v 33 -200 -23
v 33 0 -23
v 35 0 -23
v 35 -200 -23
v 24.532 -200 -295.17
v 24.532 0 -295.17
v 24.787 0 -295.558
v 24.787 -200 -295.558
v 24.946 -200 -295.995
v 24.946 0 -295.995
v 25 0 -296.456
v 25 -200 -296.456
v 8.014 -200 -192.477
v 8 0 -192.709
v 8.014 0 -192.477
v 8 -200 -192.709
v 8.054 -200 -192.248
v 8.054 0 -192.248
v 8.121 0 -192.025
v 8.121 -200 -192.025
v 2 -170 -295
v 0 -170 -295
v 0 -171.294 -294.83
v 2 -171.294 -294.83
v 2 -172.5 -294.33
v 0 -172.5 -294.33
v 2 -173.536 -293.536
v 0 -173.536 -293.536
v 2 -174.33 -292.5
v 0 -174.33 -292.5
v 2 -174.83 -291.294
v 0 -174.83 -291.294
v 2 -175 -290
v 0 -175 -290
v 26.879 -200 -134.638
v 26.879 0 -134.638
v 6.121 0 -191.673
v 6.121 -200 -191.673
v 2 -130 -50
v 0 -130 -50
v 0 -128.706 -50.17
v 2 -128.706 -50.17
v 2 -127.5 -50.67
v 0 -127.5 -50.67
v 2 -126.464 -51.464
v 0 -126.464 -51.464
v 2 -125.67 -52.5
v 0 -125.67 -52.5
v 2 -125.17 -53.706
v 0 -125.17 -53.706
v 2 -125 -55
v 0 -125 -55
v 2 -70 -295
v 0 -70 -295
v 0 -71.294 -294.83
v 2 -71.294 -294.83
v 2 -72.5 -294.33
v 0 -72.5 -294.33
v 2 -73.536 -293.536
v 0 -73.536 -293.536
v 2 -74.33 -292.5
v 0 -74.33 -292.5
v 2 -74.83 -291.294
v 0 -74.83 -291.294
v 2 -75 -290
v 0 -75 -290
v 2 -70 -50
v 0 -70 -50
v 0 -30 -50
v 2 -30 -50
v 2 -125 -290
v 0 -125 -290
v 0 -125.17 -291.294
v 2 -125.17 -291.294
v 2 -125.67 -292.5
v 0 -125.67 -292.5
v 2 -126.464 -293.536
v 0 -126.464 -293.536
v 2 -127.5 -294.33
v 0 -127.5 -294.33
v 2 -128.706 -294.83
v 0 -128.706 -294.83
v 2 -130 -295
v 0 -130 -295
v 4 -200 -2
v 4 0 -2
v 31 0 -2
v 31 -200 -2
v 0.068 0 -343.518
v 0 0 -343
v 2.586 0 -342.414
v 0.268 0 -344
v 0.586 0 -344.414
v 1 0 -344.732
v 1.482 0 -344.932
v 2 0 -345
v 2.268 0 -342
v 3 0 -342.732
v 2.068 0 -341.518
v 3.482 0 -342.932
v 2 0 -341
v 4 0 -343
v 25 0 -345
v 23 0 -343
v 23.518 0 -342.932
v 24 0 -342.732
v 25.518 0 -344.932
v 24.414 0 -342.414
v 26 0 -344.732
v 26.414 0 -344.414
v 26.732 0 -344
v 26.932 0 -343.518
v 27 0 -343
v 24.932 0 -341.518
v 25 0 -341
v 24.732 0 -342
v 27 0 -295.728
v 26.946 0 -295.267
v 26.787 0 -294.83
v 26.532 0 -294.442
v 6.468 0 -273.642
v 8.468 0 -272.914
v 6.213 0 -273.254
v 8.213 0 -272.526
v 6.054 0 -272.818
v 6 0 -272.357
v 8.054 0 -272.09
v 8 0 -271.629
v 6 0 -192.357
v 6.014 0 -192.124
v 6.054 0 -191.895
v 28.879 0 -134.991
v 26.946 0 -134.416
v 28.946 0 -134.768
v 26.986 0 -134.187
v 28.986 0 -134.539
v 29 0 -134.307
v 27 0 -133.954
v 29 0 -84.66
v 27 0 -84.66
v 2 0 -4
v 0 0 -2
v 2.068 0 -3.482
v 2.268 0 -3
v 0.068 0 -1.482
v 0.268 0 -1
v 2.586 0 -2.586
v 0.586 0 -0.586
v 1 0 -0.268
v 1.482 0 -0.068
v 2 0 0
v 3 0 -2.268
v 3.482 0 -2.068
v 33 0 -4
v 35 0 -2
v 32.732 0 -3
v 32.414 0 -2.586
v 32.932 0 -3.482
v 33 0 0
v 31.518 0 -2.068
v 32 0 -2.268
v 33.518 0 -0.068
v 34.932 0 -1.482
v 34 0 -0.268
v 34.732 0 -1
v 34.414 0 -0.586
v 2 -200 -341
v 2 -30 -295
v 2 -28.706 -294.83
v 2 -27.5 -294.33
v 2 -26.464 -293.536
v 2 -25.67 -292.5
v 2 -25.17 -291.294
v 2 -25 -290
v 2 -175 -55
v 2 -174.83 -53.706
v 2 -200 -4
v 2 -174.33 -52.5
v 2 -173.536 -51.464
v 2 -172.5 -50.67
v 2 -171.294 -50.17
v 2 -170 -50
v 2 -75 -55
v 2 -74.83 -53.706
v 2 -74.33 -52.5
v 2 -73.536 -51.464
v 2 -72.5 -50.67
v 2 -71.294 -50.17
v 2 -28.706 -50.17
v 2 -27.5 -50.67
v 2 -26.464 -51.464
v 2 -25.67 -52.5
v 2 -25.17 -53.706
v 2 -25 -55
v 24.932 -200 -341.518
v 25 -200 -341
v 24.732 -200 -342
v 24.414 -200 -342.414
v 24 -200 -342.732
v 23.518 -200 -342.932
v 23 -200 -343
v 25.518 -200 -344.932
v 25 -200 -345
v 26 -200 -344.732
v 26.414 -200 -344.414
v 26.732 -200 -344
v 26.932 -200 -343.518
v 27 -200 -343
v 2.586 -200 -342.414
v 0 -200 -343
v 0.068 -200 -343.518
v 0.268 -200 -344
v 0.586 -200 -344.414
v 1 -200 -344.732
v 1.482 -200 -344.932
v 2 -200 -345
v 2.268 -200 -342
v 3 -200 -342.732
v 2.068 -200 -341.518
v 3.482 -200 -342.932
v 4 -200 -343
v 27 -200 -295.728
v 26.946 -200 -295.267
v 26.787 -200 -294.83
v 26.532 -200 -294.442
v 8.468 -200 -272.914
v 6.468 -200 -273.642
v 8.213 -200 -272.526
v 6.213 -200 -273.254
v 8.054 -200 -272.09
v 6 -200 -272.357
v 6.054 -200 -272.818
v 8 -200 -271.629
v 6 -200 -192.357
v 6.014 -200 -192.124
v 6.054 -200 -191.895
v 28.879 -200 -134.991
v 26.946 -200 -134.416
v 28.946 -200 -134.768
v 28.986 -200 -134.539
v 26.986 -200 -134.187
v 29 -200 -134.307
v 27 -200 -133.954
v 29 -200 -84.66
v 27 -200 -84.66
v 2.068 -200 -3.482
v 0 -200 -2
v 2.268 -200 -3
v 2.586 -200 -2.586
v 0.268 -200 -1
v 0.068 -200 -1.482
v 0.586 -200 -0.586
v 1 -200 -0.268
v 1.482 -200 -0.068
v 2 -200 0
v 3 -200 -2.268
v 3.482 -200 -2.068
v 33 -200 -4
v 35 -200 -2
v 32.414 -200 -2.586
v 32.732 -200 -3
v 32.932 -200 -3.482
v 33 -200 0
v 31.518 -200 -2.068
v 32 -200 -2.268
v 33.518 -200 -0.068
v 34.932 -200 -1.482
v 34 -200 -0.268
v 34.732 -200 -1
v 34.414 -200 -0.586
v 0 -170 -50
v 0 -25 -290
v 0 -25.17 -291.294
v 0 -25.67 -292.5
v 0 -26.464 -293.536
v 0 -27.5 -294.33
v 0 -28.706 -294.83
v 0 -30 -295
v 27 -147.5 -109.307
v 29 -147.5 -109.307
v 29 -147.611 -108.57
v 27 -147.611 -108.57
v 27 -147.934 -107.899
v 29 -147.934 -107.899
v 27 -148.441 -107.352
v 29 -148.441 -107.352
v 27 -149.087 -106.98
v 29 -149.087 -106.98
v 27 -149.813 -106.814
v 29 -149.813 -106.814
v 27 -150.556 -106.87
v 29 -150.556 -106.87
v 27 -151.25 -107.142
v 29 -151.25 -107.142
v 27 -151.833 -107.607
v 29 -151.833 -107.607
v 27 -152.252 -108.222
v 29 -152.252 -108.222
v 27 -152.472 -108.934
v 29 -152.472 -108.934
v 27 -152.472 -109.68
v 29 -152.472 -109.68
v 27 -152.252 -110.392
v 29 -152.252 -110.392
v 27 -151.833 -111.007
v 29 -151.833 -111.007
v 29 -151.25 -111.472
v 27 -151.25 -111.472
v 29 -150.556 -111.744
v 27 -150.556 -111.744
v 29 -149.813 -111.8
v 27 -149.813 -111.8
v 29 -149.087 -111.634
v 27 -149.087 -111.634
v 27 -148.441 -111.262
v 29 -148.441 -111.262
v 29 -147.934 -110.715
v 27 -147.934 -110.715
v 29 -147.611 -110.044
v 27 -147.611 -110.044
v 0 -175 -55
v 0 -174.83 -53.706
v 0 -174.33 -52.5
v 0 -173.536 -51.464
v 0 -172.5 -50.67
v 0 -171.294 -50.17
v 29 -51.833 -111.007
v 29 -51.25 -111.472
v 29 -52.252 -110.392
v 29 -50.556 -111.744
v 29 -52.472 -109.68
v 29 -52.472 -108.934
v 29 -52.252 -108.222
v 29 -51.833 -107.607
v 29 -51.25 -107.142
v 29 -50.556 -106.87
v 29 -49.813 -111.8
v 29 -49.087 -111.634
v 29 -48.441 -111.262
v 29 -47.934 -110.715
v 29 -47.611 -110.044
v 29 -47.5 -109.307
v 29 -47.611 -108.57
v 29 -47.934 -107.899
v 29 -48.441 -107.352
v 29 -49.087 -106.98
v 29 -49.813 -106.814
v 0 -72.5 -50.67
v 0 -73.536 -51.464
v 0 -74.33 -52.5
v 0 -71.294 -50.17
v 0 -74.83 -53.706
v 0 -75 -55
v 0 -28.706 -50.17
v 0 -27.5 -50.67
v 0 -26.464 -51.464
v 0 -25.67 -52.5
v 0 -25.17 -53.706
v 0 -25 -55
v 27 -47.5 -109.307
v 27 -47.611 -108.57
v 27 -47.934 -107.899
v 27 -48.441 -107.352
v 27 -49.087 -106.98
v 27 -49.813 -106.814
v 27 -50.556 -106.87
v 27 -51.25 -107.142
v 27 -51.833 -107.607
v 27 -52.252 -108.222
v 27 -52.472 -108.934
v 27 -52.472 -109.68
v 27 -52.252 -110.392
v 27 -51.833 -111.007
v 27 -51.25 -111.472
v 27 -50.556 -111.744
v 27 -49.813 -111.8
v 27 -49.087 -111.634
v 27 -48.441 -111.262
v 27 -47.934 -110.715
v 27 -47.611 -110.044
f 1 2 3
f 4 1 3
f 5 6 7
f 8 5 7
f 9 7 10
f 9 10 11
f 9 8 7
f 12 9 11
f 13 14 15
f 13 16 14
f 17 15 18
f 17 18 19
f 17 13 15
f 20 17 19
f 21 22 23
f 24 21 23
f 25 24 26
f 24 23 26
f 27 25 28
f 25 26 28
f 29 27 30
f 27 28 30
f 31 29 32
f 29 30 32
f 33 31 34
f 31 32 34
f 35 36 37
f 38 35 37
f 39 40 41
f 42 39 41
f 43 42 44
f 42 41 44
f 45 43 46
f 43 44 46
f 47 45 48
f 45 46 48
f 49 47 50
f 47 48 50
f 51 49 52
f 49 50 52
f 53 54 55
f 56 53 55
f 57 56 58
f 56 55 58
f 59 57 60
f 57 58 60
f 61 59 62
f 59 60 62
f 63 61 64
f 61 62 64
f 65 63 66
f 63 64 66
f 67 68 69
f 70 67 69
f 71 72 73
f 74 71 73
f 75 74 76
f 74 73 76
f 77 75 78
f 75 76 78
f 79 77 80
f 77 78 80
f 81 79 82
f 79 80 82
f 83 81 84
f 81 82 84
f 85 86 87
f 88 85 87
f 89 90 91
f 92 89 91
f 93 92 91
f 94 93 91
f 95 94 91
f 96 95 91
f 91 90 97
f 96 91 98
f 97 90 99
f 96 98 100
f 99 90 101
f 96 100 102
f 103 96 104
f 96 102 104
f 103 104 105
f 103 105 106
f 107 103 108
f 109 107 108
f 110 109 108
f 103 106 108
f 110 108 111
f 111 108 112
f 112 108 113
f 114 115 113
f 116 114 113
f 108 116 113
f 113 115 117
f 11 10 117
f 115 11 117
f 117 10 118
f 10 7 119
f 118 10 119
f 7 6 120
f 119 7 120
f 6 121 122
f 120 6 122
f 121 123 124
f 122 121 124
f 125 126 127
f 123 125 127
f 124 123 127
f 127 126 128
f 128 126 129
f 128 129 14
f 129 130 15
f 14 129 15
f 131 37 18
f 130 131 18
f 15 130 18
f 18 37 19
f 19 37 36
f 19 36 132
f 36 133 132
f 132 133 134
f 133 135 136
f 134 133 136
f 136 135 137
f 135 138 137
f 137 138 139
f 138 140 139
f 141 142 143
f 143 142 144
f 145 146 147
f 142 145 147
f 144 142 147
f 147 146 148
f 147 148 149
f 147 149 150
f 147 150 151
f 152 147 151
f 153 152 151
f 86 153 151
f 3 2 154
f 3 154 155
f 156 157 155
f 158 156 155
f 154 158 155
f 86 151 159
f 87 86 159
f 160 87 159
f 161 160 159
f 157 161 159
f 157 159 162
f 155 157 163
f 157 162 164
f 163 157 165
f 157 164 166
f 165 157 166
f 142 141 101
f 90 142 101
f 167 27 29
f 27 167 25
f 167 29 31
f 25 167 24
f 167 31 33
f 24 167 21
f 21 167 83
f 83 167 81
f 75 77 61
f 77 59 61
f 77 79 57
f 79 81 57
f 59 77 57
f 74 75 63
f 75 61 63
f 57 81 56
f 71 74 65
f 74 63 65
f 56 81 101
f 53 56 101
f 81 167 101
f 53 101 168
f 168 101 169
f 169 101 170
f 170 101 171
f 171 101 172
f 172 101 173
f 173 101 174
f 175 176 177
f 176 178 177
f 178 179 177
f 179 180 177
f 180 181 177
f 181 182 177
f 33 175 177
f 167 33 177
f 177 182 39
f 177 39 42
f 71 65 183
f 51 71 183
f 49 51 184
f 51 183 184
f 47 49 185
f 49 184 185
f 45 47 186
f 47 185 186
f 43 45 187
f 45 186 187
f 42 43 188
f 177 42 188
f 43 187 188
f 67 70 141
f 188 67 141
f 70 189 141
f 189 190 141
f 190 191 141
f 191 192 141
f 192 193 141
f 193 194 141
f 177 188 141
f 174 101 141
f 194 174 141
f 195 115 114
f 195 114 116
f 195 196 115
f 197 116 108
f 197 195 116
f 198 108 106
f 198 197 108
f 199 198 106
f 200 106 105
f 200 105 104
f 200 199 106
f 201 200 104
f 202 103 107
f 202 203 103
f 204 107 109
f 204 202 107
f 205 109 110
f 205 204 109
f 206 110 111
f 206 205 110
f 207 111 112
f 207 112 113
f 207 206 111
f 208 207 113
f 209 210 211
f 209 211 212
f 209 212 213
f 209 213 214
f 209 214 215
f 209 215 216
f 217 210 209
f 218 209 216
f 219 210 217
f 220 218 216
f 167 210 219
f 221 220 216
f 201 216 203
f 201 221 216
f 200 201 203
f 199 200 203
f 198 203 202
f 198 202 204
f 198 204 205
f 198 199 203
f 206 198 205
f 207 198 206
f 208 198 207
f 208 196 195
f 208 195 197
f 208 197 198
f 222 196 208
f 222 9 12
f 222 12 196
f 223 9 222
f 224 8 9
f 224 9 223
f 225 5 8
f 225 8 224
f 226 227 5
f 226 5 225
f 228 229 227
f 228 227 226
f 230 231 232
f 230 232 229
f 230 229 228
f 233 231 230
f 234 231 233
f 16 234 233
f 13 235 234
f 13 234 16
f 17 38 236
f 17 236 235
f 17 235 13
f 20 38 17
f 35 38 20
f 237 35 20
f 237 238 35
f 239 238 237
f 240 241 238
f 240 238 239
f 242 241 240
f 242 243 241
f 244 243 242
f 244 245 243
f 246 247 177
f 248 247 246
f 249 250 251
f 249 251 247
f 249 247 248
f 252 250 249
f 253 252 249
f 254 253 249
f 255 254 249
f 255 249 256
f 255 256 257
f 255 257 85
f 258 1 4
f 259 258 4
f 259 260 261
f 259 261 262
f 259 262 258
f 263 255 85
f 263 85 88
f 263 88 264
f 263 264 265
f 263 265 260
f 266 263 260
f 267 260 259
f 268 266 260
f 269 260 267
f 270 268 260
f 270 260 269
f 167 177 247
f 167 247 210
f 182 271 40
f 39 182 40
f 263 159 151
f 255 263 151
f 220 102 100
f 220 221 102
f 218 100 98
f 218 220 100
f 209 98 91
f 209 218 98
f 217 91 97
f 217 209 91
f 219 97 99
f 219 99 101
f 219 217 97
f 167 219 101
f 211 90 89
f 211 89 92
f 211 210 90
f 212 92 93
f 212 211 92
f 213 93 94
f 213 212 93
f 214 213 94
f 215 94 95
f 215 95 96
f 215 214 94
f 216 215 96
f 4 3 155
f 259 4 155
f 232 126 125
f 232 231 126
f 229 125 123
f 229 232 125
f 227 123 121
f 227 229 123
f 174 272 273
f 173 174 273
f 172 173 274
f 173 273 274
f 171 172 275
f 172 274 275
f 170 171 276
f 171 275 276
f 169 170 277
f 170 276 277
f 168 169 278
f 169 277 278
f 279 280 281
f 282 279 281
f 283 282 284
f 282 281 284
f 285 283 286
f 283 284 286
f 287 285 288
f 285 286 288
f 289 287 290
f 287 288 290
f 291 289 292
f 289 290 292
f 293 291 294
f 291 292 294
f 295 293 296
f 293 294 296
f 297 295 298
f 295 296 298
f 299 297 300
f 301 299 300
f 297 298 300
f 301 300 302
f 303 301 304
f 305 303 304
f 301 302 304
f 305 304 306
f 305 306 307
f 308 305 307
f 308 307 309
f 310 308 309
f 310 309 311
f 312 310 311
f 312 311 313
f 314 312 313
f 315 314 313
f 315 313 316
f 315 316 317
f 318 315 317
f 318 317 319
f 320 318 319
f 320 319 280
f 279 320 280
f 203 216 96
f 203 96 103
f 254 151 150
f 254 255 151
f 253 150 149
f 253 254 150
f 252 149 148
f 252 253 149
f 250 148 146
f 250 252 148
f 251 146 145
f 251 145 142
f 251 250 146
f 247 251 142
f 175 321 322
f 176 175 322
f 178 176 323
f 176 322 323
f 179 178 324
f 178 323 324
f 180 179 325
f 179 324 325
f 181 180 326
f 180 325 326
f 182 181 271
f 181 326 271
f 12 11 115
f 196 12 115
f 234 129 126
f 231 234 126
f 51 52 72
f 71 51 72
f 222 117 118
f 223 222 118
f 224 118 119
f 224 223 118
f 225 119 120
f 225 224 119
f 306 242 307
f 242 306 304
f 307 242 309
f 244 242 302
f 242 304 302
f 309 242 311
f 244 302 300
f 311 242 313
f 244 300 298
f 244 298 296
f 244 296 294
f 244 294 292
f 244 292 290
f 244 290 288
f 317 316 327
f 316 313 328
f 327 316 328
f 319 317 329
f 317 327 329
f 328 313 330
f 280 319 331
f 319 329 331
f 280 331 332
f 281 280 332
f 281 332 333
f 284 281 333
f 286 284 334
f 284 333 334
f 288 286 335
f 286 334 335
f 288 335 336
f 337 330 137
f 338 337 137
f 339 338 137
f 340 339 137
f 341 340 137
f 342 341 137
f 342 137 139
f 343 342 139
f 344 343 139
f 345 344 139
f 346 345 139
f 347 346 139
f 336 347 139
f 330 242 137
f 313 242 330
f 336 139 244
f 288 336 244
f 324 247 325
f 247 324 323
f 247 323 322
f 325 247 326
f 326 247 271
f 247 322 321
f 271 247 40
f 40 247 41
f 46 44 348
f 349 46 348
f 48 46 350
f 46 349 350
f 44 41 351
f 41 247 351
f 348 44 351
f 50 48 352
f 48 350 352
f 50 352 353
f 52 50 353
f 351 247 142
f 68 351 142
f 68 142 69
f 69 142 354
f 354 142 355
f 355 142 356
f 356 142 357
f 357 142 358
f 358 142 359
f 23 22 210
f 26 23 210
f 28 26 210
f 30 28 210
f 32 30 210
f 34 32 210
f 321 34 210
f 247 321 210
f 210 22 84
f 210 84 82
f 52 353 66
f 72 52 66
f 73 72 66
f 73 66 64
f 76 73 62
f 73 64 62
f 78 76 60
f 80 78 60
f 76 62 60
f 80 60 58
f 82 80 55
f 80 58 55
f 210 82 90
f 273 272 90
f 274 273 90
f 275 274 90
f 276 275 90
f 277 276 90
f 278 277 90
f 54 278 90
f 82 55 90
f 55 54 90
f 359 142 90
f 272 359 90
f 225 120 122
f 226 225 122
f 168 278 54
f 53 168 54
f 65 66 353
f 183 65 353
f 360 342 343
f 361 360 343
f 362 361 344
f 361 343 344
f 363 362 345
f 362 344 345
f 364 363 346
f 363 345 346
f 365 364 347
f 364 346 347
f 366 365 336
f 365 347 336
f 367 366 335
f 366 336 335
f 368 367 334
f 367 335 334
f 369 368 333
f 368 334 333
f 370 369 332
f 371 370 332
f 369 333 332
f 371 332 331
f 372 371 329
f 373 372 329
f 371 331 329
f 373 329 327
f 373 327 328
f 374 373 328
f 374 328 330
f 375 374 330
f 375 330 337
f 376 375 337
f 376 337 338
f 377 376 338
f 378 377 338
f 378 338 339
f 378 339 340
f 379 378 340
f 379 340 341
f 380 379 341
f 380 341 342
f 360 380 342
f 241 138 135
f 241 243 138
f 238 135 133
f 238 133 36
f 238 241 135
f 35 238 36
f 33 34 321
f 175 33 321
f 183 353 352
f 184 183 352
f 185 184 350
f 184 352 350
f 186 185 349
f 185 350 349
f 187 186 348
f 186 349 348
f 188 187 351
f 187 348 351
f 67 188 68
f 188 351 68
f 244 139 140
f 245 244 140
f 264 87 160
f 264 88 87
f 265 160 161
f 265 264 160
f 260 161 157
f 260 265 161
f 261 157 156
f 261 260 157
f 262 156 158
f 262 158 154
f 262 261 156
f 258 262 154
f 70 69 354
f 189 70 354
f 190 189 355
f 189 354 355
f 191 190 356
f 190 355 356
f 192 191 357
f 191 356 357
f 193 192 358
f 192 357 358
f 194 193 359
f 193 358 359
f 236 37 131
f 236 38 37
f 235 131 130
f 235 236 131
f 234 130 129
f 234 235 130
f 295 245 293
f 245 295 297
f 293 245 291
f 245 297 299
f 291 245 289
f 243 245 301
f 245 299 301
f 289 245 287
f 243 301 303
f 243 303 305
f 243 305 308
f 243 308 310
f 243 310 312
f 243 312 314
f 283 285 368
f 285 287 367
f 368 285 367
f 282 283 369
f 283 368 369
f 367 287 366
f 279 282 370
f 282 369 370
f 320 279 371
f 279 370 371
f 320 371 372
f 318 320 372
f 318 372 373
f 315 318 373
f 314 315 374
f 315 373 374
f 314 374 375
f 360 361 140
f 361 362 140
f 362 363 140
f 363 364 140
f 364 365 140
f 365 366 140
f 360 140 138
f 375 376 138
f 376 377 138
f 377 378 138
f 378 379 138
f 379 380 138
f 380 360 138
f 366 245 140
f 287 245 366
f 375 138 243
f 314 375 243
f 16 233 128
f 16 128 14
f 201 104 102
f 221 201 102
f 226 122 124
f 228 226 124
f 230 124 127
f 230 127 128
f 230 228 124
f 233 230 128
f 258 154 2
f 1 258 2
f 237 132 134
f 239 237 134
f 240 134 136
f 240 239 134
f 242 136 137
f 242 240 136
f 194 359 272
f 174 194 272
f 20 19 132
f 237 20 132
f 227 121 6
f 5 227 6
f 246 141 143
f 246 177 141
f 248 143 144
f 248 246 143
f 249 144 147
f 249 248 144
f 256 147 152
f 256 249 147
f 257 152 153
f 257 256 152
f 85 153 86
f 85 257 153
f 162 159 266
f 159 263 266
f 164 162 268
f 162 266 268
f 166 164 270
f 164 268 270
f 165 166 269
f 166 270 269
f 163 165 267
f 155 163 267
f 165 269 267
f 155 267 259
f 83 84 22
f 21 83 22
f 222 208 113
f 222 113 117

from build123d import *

# Parameters (mm, degrees)
F1_DEPTH = 200
F2_R     = 2
F4_DEPTH = 4
F6_D     = 5
F6_DEPTH = 2


with BuildPart() as f1:
    # F0 (on Front) → F1 (new body)
    with BuildSketch(Plane.XZ):
        Polygon((35, 0), (0, 0), (0, -345), (27, -345), (27, -295), (8, -272.356682), (8, -192.356682), (29, -134.659656), (29, -84.659656), (27, -84.659656), (27, -134.307002), (6, -192.004028), (6, -273.084622), (25, -295.72794), (25, -343), (2, -343), (2, -2), (33, -2), (33, -23), (35, -23), align=None)
    extrude(amount=F1_DEPTH)

    # F2
    f2_edges = [f1.edges().sort_by_distance(p)[0] for p in [
        (0, -100, 0),
        (35, -100, 0),
        (33, -100, -2),
        (2, -100, -2),
        (0, -100, -345),
        (2, -100, -343),
        (27, -100, -345),
        (25, -100, -343),
        (25, -100, -295.72794),
        (27, -100, -295),
        (8, -100, -272.356682),
        (6, -100, -273.084622),
        (6, -100, -192.004028),
        (8, -100, -192.356682),
        (29, -100, -134.659656),
        (27, -100, -134.307002),
    ]]
    fillet(f2_edges, radius=F2_R)

    # F3 (on face) → F4 (cut)
    with BuildSketch(Plane(origin=(0, 0, 0), x_dir=(0, -1, 0), z_dir=(-1, 0, 0))):
        with BuildLine():
            Line((70, -50), (30, -50))
            ThreePointArc((30, -50), (26.464466, -51.464466), (25, -55))
            Line((25, -55), (25, -290))
            ThreePointArc((25, -290), (26.464466, -293.535534), (30, -295))
            Line((30, -295), (70, -295))
            ThreePointArc((70, -295), (73.535534, -293.535534), (75, -290))
            Line((75, -290), (75, -55))
            ThreePointArc((75, -55), (73.535534, -51.464466), (70, -50))
        make_face()
        with BuildLine():
            ThreePointArc((130, -50), (126.464466, -51.464466), (125, -55))
            Line((125, -55), (125, -290))
            ThreePointArc((125, -290), (126.464466, -293.535534), (130, -295))
            Line((130, -295), (170, -295))
            ThreePointArc((170, -295), (173.535534, -293.535534), (175, -290))
            Line((175, -290), (175, -55))
            ThreePointArc((175, -55), (173.535534, -51.464466), (170, -50))
            Line((170, -50), (130, -50))
        make_face()
    extrude(amount=-F4_DEPTH, mode=Mode.SUBTRACT)

    # F6
    with Locations(Plane(origin=(27, 0, 0), x_dir=(0, -1, 0), z_dir=(-1, 0, 0))):
        with Locations((50, -109.307002), (150, -109.307002)):
            Hole(F6_D / 2, depth=F6_DEPTH)


solid = f1.part
